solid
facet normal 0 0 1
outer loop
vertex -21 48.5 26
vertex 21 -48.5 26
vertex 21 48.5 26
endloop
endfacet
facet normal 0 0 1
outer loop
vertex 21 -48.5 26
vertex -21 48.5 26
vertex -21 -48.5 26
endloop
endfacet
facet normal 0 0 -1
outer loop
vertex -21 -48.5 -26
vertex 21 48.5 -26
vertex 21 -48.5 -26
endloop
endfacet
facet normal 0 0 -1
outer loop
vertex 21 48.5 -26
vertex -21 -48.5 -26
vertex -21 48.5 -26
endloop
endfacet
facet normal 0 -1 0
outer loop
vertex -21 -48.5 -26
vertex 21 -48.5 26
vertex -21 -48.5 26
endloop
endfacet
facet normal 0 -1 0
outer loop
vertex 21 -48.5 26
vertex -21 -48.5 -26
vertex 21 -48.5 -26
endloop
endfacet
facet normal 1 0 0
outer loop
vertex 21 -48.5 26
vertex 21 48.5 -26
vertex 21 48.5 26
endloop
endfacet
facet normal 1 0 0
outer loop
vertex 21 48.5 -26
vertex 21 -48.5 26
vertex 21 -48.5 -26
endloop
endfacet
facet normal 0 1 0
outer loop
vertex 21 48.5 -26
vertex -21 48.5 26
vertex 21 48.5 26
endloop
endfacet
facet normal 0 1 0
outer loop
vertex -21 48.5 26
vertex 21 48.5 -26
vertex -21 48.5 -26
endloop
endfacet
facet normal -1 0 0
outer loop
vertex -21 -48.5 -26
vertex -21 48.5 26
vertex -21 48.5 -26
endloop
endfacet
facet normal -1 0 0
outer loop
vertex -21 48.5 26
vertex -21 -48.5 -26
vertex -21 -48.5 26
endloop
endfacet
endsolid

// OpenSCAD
module smallBattery()
{
	color([0.1,0.1,0.1])
	{
		cube([42, 97, 52], center=true);
	}
}

smallBattery();
